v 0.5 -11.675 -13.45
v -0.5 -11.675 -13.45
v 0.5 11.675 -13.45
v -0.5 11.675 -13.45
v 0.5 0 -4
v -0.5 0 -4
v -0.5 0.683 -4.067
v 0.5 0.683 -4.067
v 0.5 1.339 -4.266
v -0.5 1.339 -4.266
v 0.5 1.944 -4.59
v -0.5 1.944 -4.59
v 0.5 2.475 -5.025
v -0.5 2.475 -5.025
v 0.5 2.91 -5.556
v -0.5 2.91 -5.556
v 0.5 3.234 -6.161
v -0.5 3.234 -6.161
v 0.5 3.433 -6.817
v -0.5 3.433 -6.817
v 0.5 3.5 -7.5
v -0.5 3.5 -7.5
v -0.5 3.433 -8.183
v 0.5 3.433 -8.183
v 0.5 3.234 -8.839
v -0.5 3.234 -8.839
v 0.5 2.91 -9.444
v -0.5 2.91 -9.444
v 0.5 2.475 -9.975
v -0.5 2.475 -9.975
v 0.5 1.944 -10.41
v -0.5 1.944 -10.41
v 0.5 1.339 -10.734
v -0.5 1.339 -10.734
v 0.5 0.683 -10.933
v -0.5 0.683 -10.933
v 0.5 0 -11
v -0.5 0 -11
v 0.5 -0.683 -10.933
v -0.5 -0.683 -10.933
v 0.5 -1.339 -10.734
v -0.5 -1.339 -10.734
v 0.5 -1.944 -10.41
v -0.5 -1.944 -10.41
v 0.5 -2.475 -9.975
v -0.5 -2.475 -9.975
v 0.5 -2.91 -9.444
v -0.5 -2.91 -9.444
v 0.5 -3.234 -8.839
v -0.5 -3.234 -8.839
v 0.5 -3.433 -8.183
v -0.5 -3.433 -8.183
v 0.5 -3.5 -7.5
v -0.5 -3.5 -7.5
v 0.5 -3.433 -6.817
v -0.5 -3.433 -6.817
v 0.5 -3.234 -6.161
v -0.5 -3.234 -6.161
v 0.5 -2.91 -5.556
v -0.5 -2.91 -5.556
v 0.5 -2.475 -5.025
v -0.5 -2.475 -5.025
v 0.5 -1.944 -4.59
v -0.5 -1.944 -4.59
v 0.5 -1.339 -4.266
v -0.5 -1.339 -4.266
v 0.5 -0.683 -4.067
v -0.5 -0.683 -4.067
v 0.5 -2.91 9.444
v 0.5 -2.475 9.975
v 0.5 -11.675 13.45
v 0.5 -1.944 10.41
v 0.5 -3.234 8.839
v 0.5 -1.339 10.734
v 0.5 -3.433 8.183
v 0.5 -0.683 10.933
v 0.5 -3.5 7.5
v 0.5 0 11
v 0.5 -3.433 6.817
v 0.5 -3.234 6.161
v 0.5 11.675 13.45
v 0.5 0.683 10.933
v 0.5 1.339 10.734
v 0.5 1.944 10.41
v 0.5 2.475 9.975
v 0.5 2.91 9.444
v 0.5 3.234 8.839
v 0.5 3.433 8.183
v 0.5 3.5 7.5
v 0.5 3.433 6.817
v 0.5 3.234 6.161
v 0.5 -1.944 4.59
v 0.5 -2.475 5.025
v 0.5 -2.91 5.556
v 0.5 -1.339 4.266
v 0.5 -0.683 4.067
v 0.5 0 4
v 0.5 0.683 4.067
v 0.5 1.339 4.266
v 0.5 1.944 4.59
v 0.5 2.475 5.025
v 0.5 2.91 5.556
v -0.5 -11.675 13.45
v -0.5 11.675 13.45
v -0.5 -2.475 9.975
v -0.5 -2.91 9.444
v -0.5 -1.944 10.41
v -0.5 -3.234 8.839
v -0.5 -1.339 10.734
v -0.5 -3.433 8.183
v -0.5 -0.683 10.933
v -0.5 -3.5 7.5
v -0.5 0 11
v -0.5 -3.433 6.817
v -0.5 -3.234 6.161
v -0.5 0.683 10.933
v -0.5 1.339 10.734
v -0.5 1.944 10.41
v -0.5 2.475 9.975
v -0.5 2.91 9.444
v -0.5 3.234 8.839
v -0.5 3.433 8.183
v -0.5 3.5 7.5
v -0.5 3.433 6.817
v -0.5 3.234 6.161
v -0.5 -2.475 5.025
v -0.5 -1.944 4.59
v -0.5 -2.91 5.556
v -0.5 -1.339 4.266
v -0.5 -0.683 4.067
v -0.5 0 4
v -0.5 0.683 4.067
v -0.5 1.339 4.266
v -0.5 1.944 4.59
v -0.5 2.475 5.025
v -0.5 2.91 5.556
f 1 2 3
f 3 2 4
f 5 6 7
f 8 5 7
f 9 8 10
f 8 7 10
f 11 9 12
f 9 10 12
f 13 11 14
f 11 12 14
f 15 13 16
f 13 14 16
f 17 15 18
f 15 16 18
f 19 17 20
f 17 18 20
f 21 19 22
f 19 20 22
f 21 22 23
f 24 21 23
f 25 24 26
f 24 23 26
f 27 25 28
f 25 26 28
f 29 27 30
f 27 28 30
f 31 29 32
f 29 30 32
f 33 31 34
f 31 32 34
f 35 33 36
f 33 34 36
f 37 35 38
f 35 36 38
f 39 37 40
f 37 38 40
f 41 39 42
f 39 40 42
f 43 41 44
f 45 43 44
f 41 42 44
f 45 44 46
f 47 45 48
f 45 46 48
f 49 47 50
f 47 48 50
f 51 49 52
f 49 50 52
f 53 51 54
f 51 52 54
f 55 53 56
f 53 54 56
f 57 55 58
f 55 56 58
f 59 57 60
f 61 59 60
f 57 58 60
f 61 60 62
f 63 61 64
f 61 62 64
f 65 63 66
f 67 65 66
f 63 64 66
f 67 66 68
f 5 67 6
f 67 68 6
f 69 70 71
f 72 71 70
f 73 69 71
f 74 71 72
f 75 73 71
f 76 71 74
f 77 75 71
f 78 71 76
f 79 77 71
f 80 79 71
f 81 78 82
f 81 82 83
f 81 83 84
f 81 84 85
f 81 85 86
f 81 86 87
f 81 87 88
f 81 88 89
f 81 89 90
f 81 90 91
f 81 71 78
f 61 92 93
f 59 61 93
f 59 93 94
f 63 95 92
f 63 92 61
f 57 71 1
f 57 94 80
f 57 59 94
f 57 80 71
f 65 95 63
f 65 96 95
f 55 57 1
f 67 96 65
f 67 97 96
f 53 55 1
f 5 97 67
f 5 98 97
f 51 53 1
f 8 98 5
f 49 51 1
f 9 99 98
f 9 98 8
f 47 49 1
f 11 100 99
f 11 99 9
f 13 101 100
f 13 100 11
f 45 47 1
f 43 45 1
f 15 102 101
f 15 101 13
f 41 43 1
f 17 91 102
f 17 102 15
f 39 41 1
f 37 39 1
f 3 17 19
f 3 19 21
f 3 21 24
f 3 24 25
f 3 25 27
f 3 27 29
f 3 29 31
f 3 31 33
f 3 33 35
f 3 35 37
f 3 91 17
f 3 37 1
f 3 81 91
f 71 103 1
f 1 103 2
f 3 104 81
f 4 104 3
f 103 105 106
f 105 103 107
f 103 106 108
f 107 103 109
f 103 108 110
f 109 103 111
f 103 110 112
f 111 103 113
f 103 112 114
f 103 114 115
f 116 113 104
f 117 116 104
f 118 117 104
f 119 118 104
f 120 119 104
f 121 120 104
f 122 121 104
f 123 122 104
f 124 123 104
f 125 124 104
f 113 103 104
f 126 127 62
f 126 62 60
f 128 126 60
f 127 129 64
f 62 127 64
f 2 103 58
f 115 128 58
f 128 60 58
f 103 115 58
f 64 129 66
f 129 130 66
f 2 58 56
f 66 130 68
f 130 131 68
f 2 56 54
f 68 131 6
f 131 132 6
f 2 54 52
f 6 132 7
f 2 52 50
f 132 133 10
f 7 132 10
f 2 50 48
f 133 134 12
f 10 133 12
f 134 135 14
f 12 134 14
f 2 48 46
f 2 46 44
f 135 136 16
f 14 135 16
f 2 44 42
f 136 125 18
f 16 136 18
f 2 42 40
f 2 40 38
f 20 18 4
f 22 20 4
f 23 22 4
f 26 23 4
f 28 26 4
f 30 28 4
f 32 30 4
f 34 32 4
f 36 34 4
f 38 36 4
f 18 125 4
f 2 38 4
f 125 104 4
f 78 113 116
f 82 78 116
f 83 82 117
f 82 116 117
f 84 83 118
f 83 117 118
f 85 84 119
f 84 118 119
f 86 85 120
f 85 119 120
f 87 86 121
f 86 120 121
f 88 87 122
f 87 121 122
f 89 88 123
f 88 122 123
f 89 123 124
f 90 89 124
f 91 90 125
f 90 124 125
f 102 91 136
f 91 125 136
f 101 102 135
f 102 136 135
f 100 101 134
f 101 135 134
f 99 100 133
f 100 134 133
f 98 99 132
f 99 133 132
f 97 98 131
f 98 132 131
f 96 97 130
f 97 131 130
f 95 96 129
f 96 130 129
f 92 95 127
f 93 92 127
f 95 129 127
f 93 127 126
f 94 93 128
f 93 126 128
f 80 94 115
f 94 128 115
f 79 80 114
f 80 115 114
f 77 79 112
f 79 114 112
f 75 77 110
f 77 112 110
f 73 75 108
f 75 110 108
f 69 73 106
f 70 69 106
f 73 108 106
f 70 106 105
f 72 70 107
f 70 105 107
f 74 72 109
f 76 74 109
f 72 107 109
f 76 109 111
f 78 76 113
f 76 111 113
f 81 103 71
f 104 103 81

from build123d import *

# Parameters (mm, degrees)
FLANGE_BASE1_START     = -0.5
FLANGE_BASE1_OUTLINE_W = 26.9
FLANGE_BASE1_OUTLINE_H = 23.35
FLANGE_BASE1_DEPTH     = 1
ESBO_O2_R              = 3.5
CORTE_EXTRUS_O1_DEPTH  = 1


# Read off the part's stored shape, not the designer's step: Flange-base1
with BuildPart() as part:
    # Flange-base1 outline → Flange-base1 (new body)
    with BuildSketch(Plane(origin=(0, 0, 0), x_dir=(0, 0, -1), z_dir=(1, 0, 0)).offset(FLANGE_BASE1_START)):
        Rectangle(FLANGE_BASE1_OUTLINE_W, FLANGE_BASE1_OUTLINE_H)
    extrude(amount=FLANGE_BASE1_DEPTH)

    # Esboço2 → Corte-extrusão1 (cut)
    with BuildSketch(Plane.ZY.offset(0.5)):
        with Locations((-7.5, 0)):
            Circle(ESBO_O2_R)
        with Locations((7.5, 0)):
            Circle(ESBO_O2_R)
    extrude(amount=-CORTE_EXTRUS_O1_DEPTH, mode=Mode.SUBTRACT)


solid = part.part
